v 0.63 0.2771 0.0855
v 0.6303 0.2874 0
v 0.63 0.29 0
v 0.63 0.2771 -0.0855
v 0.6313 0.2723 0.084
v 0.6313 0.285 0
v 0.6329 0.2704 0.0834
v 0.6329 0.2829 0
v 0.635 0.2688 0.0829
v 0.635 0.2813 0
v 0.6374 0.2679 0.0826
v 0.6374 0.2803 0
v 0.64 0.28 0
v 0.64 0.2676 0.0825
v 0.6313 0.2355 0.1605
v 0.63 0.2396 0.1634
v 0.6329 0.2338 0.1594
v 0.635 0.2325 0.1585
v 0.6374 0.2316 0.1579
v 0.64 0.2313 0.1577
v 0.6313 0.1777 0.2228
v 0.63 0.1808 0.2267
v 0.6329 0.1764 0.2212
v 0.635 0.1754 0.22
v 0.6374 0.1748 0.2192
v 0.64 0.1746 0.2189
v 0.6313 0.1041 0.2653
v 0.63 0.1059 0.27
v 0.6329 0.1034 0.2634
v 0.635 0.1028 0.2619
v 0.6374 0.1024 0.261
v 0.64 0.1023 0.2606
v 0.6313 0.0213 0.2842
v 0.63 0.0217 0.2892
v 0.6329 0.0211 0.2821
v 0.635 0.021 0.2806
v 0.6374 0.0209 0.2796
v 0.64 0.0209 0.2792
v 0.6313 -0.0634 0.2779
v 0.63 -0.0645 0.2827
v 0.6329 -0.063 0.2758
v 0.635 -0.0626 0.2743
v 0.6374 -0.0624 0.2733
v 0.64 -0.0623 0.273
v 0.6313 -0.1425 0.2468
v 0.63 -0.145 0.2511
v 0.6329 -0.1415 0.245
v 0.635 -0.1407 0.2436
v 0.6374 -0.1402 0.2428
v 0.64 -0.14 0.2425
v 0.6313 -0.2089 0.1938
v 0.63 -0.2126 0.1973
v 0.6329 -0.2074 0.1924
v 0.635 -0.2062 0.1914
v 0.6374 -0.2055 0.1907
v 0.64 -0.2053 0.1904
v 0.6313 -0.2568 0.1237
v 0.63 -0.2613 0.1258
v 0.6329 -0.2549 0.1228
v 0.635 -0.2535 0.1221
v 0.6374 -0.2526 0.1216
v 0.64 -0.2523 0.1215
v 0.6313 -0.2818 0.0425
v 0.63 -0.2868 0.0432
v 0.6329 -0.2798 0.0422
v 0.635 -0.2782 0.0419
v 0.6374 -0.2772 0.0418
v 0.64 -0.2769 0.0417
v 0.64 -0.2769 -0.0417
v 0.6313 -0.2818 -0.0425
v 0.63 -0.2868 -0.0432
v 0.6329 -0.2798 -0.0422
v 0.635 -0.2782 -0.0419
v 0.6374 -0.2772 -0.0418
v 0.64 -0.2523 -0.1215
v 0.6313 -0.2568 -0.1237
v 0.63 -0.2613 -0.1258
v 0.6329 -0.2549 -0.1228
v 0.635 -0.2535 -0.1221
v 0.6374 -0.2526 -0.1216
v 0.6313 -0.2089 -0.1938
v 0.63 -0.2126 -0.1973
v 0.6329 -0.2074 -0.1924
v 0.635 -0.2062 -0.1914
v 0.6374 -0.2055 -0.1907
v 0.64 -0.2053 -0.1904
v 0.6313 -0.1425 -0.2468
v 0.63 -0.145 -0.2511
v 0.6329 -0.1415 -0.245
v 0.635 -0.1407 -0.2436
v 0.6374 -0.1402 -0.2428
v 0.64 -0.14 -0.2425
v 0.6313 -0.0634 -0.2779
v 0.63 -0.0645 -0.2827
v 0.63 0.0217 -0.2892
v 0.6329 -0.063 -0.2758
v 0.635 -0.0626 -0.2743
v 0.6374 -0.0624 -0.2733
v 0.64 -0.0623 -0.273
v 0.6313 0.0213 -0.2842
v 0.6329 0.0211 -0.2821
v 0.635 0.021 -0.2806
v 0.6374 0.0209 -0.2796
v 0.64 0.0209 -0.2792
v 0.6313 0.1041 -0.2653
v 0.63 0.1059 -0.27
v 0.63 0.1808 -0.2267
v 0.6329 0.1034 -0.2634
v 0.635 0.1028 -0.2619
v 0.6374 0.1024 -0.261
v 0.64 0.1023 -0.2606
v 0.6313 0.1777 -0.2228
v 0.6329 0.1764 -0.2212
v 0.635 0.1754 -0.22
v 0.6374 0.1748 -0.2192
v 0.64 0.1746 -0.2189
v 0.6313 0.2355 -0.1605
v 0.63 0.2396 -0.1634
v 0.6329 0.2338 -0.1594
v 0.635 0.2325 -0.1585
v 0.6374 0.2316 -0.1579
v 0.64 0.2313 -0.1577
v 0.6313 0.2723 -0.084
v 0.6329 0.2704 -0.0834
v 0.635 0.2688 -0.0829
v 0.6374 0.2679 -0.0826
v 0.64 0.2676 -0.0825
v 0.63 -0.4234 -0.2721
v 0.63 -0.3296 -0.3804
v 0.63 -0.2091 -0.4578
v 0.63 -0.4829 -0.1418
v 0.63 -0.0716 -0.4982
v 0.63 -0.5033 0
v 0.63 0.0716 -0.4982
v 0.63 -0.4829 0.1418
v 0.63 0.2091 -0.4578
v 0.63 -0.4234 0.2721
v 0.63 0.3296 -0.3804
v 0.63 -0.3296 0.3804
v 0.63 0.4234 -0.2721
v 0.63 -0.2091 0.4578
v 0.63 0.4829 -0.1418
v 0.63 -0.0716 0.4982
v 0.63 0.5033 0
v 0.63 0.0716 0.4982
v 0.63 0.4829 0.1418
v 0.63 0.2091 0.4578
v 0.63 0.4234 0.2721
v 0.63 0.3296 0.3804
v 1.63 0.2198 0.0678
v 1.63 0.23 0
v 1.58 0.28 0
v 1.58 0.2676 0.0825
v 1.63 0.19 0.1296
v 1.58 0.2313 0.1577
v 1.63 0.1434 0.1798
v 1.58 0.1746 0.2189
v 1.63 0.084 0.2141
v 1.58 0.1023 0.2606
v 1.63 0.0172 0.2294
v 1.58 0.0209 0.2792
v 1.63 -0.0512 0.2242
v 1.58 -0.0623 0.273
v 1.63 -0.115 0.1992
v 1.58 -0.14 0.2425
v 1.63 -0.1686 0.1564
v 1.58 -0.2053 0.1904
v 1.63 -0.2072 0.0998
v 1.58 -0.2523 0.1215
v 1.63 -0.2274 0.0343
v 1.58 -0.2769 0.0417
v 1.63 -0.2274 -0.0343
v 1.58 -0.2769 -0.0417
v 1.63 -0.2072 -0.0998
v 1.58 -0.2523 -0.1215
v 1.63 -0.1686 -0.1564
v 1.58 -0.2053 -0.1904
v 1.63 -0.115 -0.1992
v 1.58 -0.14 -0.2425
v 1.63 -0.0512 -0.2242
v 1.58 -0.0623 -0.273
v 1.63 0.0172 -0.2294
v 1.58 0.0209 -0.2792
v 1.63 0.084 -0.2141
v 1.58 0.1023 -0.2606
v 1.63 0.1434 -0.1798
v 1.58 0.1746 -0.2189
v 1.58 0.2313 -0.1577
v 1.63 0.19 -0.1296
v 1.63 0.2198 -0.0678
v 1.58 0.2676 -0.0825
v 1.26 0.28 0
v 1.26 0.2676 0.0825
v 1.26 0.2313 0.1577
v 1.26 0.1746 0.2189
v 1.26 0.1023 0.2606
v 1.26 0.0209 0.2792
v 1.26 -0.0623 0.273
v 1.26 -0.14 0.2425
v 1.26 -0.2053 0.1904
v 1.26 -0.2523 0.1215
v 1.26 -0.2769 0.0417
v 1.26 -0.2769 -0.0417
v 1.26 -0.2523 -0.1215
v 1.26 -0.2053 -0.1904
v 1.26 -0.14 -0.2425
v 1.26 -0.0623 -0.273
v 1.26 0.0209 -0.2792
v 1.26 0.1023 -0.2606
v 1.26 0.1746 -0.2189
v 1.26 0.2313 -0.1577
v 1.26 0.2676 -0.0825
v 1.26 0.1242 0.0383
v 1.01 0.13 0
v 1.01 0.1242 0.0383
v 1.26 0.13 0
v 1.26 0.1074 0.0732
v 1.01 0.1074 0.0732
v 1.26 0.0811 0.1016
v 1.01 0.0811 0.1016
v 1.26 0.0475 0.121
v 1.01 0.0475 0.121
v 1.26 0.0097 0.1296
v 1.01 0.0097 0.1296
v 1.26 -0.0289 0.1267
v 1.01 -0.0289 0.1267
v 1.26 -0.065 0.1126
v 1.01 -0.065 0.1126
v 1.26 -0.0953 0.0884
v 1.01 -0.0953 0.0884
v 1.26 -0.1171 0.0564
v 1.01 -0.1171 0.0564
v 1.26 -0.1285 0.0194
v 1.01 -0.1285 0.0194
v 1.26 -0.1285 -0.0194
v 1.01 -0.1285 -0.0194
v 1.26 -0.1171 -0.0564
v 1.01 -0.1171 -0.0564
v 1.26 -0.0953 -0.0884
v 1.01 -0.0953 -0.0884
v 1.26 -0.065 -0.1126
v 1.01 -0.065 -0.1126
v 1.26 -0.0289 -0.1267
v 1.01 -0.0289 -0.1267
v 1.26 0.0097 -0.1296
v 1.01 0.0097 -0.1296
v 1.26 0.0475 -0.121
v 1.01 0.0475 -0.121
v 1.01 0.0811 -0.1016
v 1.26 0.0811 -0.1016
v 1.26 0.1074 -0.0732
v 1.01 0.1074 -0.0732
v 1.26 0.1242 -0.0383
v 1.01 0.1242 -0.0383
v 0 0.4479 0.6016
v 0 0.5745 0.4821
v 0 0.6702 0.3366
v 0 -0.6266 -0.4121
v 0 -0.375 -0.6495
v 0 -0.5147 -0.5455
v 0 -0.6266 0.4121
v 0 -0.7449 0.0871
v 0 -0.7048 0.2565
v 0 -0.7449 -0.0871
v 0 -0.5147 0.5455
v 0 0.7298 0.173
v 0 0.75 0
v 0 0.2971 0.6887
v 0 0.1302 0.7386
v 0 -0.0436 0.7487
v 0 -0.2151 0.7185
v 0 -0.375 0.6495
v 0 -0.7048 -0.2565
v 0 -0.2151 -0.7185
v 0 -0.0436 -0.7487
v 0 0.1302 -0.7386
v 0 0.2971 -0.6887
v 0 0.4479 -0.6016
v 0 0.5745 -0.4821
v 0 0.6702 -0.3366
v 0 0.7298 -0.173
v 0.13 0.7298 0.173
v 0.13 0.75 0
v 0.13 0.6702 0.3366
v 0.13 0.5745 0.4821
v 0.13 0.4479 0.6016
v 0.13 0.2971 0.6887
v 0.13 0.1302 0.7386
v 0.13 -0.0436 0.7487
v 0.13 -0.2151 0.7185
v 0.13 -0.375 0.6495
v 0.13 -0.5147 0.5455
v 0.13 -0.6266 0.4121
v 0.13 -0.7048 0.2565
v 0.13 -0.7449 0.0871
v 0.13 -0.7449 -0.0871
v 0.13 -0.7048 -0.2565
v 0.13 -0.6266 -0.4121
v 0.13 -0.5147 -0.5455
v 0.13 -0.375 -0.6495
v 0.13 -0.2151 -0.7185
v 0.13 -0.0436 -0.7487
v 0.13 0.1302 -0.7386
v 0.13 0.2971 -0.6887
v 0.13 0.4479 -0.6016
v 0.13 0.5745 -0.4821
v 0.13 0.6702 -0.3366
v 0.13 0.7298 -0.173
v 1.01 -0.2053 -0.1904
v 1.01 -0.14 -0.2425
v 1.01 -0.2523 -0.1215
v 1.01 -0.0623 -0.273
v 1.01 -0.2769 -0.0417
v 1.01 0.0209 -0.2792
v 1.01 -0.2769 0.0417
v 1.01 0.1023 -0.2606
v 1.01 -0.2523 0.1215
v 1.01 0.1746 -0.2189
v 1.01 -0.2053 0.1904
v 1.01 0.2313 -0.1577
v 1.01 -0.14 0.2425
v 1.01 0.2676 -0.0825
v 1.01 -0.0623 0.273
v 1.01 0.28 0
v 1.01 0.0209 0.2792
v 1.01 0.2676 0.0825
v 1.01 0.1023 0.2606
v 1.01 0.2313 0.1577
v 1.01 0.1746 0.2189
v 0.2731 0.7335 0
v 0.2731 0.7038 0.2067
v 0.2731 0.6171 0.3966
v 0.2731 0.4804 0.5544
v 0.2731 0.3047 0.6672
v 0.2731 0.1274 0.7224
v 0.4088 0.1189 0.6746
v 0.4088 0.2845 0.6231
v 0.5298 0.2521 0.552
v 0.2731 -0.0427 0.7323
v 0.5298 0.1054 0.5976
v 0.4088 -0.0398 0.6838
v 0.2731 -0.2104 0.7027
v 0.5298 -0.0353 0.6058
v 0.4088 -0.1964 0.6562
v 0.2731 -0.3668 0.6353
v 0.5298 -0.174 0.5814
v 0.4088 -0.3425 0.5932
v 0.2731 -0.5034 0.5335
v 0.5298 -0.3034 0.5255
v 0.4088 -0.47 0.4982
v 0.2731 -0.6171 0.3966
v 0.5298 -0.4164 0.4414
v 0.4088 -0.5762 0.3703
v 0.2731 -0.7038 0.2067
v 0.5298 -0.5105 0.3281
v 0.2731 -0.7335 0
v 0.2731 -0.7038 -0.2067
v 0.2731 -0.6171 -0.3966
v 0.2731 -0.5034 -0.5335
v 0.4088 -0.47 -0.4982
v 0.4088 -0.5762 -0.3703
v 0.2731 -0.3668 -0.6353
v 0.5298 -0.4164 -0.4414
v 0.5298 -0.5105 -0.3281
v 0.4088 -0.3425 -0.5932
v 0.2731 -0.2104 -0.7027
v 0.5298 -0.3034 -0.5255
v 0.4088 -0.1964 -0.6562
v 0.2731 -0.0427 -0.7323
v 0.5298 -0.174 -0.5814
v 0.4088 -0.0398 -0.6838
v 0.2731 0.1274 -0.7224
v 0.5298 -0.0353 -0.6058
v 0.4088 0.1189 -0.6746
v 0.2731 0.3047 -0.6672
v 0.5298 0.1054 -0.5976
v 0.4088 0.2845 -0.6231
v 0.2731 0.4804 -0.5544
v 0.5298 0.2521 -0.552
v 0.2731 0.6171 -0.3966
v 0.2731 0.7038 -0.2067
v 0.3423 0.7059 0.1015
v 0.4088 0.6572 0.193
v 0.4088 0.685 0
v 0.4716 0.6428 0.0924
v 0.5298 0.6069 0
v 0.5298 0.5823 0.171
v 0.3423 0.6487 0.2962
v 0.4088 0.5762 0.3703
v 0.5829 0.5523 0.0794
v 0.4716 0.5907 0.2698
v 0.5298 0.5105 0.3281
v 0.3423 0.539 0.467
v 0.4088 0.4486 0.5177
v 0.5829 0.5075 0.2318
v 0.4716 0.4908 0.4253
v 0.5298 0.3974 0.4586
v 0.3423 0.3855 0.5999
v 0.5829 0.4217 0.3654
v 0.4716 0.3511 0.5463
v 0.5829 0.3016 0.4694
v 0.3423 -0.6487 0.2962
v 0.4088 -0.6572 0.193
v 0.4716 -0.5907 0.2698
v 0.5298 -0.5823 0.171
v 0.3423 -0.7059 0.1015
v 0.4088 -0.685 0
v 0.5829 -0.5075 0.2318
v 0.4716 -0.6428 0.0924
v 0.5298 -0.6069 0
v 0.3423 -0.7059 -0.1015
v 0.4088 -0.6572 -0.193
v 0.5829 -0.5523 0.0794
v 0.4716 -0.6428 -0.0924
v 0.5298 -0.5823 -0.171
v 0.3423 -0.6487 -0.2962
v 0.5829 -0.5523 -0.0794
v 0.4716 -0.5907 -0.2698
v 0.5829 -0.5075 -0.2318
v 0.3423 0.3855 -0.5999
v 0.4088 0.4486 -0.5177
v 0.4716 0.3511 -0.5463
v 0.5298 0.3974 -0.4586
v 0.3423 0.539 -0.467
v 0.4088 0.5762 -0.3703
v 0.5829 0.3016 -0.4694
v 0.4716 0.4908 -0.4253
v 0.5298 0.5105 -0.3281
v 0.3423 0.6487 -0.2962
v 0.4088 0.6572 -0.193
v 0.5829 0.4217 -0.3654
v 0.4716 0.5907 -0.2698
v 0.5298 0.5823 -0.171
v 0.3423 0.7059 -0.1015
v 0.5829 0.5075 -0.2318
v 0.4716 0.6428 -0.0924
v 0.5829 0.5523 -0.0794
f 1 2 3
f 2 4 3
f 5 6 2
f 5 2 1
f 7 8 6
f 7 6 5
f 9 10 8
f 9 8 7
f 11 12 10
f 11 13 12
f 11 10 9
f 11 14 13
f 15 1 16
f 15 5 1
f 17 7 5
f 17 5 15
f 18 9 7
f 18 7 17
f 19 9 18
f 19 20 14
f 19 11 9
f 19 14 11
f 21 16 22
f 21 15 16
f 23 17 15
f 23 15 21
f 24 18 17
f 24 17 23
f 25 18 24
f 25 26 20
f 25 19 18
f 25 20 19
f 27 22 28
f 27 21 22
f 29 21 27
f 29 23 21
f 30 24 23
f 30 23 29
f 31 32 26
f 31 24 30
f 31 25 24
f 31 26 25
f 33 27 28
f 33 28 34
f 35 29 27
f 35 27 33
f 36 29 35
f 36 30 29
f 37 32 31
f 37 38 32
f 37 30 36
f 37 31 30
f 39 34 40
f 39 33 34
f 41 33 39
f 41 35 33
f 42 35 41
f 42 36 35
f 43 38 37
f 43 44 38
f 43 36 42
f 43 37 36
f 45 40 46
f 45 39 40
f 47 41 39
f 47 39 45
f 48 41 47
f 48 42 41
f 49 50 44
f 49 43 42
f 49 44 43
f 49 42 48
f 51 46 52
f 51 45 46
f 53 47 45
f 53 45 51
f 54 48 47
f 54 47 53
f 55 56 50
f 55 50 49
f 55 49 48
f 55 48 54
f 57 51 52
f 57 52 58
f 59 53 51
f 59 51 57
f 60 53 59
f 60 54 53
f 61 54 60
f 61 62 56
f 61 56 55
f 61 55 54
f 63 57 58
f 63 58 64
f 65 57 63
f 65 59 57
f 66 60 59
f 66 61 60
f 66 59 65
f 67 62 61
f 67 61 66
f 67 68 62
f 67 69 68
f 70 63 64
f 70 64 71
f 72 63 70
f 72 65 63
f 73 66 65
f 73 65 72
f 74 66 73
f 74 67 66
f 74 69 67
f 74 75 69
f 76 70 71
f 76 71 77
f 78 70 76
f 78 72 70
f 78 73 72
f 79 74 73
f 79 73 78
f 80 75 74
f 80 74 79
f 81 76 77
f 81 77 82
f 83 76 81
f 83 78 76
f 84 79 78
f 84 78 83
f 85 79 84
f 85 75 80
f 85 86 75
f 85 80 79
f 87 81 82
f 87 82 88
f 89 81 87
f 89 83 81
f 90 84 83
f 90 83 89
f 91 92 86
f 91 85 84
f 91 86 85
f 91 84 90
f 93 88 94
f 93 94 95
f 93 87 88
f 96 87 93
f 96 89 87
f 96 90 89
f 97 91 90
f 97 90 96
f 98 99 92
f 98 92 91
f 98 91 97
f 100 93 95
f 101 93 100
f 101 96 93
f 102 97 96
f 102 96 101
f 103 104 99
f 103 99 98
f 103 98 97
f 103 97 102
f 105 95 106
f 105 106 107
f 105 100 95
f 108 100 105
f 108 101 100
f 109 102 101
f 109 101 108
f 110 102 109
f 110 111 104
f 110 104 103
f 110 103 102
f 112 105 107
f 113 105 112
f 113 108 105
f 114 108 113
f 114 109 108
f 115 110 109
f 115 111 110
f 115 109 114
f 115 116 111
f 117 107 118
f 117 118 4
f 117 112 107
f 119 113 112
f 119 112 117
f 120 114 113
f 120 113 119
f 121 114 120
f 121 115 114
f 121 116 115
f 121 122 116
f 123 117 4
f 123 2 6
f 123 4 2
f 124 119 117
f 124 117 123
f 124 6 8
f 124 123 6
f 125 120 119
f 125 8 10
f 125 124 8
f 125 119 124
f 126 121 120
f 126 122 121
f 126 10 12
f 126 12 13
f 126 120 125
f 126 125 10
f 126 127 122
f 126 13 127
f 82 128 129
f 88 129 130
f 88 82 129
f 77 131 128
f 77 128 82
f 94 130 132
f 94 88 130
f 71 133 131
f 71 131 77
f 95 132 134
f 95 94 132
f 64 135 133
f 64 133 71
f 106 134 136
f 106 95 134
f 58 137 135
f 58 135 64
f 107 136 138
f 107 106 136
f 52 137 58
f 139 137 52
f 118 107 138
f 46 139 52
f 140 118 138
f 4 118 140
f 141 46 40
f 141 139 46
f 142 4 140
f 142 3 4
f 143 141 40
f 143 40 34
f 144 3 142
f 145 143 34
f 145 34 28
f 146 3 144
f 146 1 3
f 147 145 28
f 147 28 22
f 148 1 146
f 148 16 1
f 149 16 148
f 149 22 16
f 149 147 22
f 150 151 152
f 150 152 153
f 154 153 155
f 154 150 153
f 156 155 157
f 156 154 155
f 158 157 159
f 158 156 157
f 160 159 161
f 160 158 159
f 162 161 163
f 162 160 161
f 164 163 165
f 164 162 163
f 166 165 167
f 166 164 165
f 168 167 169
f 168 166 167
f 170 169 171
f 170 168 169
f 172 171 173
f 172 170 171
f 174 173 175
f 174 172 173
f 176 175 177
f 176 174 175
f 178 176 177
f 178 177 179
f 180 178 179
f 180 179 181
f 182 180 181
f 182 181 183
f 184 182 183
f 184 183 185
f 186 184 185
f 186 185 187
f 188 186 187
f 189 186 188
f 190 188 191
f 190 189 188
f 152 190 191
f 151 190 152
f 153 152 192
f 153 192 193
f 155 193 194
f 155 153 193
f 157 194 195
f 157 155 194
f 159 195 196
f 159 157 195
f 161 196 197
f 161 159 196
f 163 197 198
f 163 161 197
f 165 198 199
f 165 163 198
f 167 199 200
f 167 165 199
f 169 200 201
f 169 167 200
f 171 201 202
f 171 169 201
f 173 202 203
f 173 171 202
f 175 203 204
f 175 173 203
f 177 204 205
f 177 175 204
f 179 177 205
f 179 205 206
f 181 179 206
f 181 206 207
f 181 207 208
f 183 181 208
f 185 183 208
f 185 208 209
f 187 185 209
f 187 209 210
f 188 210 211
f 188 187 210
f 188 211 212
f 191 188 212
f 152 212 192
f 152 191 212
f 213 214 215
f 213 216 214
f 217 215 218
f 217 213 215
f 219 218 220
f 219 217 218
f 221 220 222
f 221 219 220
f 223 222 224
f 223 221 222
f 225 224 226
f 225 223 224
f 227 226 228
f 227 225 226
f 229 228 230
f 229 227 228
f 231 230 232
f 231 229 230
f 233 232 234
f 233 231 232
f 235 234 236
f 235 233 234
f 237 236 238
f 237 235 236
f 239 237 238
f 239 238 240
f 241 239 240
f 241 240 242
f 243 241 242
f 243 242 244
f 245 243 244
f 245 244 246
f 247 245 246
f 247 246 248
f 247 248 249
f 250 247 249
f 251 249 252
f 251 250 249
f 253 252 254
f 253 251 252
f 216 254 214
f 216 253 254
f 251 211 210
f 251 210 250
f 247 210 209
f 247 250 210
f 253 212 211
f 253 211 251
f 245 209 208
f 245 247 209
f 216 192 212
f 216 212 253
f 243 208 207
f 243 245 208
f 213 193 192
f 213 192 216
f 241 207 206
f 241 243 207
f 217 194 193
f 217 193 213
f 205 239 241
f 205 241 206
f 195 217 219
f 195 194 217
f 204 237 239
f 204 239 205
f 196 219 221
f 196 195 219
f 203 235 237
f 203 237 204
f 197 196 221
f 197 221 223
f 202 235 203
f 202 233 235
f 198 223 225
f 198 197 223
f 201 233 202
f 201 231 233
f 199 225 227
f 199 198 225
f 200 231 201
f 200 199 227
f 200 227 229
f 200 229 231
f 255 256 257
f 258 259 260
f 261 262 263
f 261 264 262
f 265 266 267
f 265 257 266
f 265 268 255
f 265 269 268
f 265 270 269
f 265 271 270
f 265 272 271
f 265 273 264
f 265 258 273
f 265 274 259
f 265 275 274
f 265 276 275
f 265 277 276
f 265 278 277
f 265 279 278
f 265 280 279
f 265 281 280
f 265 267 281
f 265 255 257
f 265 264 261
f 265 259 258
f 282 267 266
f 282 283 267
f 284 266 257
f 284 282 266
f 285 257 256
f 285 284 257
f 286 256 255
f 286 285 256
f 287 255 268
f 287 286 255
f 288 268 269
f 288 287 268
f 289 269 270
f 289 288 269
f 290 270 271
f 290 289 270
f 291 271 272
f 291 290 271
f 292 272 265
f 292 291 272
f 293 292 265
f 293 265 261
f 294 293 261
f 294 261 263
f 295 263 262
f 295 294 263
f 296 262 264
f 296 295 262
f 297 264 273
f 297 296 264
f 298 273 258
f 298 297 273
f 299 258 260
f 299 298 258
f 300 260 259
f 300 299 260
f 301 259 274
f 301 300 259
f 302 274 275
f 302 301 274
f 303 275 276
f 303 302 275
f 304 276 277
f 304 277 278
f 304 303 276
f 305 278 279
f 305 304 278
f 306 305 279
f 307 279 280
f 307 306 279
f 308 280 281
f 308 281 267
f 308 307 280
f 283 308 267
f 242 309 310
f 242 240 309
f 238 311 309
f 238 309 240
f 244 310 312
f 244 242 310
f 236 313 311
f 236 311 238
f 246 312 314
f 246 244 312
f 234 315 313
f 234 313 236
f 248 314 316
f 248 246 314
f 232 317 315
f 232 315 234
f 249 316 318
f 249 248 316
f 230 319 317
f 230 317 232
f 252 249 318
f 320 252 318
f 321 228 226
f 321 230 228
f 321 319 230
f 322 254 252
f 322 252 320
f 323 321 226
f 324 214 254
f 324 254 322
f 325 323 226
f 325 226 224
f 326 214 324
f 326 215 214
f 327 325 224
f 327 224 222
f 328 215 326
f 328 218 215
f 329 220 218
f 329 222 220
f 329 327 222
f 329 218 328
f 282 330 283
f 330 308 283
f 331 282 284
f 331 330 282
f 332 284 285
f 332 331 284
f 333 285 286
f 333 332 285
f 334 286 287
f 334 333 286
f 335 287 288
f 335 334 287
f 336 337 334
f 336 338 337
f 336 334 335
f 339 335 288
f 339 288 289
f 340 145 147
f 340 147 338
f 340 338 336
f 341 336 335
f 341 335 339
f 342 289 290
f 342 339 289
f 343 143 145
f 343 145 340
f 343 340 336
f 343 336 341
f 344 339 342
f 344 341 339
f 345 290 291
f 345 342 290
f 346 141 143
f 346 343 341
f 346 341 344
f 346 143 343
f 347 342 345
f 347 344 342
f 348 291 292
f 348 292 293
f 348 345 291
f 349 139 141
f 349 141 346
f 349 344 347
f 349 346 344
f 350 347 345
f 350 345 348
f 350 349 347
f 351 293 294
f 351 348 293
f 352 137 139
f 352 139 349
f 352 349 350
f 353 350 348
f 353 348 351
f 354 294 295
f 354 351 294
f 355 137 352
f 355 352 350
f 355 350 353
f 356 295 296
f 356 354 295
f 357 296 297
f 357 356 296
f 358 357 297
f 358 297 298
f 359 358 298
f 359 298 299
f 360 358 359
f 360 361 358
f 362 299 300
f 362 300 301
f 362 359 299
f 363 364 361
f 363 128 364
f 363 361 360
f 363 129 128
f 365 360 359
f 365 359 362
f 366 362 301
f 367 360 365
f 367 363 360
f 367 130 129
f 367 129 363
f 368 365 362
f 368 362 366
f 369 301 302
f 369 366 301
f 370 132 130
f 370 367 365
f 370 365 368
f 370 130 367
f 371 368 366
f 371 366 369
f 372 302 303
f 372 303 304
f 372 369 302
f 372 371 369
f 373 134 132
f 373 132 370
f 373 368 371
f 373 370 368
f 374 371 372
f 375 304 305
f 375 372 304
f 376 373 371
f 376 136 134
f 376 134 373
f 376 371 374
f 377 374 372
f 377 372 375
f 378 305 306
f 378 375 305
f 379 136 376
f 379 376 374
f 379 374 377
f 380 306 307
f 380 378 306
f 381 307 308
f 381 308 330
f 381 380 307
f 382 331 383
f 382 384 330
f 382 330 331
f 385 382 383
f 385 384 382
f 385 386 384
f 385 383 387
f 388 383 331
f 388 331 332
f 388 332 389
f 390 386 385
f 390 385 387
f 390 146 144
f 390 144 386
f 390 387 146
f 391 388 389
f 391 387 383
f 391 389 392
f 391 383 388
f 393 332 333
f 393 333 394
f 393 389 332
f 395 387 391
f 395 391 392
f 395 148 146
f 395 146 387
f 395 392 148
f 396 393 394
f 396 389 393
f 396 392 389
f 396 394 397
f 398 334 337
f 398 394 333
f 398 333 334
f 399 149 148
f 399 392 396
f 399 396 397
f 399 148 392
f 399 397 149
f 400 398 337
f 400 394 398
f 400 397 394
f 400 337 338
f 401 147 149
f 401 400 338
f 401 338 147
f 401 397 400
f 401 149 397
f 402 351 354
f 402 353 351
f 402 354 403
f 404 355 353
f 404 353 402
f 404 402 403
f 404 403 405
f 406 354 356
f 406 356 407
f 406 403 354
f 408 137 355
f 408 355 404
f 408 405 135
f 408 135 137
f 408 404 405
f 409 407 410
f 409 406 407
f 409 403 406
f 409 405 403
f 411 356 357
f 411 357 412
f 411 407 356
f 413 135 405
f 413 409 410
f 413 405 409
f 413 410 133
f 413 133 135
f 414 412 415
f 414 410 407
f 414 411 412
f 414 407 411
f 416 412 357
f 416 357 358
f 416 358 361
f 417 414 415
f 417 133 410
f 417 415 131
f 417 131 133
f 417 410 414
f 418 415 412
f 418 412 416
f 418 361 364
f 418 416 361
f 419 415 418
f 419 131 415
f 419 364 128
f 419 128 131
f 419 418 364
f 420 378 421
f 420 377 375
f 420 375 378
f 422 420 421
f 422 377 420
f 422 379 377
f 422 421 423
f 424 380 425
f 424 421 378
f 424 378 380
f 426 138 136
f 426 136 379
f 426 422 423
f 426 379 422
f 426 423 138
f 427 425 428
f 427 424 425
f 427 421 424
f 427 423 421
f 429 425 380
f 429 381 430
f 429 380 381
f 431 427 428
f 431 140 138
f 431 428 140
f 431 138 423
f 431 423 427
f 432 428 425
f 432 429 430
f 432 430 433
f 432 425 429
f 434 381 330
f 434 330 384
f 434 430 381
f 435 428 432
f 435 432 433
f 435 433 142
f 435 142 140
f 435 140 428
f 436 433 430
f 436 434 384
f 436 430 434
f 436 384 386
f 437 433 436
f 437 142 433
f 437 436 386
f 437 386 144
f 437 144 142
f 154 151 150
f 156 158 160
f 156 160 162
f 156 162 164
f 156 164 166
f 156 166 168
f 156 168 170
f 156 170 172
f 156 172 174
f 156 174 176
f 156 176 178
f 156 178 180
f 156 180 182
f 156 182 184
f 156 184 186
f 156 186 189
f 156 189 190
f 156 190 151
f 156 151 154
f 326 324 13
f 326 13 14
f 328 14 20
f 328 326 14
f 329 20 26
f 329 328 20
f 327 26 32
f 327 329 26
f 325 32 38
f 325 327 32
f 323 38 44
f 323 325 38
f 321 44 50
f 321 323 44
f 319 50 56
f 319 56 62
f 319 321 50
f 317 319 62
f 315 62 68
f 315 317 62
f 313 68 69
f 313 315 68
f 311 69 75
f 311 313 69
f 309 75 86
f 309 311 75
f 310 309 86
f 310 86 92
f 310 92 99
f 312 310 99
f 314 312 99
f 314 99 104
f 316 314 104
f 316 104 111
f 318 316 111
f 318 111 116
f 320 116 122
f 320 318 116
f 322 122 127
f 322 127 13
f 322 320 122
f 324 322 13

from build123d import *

# Parameters (mm, degrees)
FILLET1_R     = 0.01
CHAMFER1_SIZE = 0.05


with BuildPart() as part:
    # Sketch1 → Revolve1 (revolve)
    with BuildSketch(Plane.XY):
        with BuildLine():
            Line((0, 0), (0, 0.75))
            Line((0, 0.75), (0.13, 0.75))
            ThreePointArc((0.13, 0.75), (0.408779953, 0.684961714), (0.63, 0.503275358))
            Line((0.63, 0.503275358), (0.63, 0.28))
            Line((0.63, 0.28), (1.01, 0.28))
            Line((1.01, 0.28), (1.01, 0.13))
            Line((1.01, 0.13), (1.26, 0.13))
            Line((1.26, 0.13), (1.26, 0.28))
            Line((1.26, 0.28), (1.63, 0.28))
            Line((1.63, 0.28), (1.63, 0))
            Line((1.63, 0), (0, 0))
        make_face()
    revolve(axis=Axis((-1.695285667, 0, 0), (1, 0, 0)))

    # Fillet1
    fillet1_edges = [part.edges().sort_by_distance(p)[0] for p in [
        (0.63, -0.28, 0),
    ]]
    fillet(fillet1_edges, radius=FILLET1_R)

    # Chamfer1
    chamfer1_edges = [part.edges().sort_by_distance(p)[0] for p in [
        (1.63, -0.28, 0),
    ]]
    chamfer(chamfer1_edges, length=CHAMFER1_SIZE)


solid = part.part
